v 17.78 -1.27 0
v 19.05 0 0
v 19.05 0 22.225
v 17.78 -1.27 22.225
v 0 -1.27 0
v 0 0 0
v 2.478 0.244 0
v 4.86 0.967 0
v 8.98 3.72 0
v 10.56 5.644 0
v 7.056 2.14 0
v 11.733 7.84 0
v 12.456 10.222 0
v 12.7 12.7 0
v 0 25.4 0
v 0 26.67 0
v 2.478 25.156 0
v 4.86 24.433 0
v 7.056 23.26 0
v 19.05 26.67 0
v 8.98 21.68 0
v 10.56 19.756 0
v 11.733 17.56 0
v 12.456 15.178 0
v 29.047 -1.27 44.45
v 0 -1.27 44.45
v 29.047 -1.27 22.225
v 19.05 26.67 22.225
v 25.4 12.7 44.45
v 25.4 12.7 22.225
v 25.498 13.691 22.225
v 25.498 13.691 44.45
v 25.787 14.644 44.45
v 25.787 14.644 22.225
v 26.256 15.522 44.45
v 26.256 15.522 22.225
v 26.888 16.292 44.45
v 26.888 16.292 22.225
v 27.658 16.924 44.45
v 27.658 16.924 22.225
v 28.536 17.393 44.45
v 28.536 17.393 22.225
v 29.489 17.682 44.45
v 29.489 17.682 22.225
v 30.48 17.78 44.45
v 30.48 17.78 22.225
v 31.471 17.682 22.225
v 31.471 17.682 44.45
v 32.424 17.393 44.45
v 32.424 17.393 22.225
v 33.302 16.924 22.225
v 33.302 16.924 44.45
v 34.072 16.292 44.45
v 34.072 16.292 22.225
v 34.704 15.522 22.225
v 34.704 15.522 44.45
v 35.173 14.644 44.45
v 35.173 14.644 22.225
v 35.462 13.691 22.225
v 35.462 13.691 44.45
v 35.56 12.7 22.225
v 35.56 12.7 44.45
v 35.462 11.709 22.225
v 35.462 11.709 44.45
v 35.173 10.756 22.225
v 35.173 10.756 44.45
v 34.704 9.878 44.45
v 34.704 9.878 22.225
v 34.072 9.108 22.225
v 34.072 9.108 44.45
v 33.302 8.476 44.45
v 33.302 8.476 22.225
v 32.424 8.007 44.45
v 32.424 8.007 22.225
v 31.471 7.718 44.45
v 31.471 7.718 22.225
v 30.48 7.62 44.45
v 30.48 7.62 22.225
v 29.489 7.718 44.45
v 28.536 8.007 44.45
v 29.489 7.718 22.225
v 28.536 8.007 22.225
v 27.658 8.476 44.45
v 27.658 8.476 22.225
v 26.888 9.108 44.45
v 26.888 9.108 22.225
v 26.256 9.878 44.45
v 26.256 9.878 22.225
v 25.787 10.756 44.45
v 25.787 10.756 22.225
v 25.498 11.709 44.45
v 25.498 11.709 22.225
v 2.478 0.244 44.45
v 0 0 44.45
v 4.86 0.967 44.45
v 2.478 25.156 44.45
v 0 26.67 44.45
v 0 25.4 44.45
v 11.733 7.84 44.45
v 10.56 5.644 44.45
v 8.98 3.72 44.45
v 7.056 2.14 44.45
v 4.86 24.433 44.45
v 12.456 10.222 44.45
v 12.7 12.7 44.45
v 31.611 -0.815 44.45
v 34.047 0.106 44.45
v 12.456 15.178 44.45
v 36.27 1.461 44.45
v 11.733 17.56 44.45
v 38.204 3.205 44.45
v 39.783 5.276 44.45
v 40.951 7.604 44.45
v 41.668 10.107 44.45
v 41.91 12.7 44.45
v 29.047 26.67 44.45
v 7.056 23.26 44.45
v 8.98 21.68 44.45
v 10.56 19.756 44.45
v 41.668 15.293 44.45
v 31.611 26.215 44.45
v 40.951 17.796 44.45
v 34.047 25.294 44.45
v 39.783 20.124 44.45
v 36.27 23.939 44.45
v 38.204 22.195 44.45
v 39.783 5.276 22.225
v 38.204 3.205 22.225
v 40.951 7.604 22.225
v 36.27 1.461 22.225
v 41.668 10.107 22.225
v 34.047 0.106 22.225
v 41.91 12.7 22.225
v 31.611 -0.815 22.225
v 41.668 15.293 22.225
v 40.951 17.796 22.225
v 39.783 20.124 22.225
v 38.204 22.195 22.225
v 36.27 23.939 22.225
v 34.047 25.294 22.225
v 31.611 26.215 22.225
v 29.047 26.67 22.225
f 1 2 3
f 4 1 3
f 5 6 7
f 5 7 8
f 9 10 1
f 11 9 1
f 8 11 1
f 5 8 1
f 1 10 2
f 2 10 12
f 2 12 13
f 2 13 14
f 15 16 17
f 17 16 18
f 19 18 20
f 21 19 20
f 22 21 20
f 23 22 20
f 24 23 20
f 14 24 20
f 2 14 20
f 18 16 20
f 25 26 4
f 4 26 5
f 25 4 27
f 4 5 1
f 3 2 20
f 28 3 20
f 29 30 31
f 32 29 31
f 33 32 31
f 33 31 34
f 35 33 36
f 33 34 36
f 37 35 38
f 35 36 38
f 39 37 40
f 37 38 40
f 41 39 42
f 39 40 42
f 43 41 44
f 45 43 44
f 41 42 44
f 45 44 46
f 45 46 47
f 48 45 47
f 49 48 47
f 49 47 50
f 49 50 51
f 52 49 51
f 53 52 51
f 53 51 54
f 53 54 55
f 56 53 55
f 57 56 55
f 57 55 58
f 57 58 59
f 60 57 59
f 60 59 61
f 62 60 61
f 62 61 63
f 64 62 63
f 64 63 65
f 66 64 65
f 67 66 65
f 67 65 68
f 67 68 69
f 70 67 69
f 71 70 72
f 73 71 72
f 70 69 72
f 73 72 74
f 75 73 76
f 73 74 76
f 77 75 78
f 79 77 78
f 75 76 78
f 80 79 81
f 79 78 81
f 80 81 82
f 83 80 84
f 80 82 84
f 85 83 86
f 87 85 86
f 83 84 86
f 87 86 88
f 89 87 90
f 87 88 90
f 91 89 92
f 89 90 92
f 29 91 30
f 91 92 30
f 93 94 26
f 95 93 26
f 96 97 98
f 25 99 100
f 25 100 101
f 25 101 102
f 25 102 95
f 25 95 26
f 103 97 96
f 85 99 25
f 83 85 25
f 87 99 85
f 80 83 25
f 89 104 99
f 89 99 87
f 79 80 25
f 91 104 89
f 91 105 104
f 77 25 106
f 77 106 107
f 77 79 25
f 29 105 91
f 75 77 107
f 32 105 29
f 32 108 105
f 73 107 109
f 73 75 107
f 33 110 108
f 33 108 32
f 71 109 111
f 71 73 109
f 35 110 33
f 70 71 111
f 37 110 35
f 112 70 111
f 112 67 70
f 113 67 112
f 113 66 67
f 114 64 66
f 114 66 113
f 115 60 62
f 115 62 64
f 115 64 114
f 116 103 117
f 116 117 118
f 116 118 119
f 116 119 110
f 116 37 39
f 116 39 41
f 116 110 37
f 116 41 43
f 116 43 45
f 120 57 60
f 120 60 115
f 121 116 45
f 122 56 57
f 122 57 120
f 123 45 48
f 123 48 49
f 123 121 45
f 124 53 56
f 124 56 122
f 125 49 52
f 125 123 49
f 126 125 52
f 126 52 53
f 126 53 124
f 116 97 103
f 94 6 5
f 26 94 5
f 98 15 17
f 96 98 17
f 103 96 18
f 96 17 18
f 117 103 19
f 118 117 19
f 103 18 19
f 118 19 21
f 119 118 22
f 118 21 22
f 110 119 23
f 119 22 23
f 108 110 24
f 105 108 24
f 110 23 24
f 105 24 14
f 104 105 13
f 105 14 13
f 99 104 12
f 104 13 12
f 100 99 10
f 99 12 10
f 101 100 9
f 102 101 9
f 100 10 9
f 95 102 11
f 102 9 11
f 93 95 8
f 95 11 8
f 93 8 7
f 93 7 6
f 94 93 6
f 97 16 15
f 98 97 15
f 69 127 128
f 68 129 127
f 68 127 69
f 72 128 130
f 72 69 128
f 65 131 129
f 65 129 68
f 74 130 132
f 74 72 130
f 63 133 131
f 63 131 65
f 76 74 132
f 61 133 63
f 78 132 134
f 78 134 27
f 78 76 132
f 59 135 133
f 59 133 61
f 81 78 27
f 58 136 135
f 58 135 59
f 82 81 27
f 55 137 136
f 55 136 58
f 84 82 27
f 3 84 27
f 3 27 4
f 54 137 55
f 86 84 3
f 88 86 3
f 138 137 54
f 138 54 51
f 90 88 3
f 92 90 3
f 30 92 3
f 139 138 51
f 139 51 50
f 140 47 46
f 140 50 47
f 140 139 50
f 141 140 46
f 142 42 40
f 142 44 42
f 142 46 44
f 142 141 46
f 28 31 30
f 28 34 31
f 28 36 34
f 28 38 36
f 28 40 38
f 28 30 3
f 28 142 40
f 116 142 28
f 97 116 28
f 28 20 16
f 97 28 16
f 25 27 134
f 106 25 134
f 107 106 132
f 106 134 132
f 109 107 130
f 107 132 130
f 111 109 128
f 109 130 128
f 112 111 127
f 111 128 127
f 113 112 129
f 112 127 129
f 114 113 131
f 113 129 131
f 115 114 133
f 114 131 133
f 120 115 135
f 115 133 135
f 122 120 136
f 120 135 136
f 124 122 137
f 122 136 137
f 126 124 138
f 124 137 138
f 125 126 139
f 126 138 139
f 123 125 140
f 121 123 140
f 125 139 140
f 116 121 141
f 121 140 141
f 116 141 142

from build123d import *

# Parameters (mm, degrees)
BOSS_EXTRUDE1_DEPTH          = 44.45
CUT_EXTRUDE1_DEPTH           = 22.225
F_3_8_0_375_DIAMETER_HOLE1_D = 10.16
CHAMFER1_SIZE                = 1.27


with BuildPart() as part:
    # Sketch1 → Boss-Extrude1 (new body)
    with BuildSketch(Plane.XY):
        with BuildLine():
            Line((0, -1.27), (29.046742048, -1.27))
            ThreePointArc((29.046742048, -1.27), (41.91, 12.7), (29.046742048, 26.67))
            Line((29.046742048, 26.67), (0, 26.67))
            Line((0, 26.67), (0, 25.4))
            ThreePointArc((0, 25.4), (12.7, 12.7), (0, 0))
            Line((0, 0), (0, -1.27))
        make_face()
    extrude(amount=BOSS_EXTRUDE1_DEPTH)

    # Sketch2 → Cut-Extrude1 (cut)
    with BuildSketch(Plane(origin=(0, 0, 0), x_dir=(-1, 0, 0), z_dir=(0, 0, -1))):
        with BuildLine():
            Line((-19.05, -1.27), (-19.05, 26.67))
            Line((-19.05, 26.67), (-29.046742048, 26.67))
            ThreePointArc((-29.046742048, 26.67), (-41.91, 12.7), (-29.046742048, -1.27))
            Line((-29.046742048, -1.27), (-19.05, -1.27))
        make_face()
    extrude(amount=-CUT_EXTRUDE1_DEPTH, mode=Mode.SUBTRACT)

    # 3/8 (0.375) Diameter Hole1 (through all)
    with Locations(Plane.XY.offset(44.45)):
        with Locations((30.48, 12.7)):
            Hole(F_3_8_0_375_DIAMETER_HOLE1_D / 2)

    # Chamfer1
    chamfer1_edges = [part.edges().sort_by_distance(p)[0] for p in [
        (19.05, -1.27, 11.1125),
    ]]
    chamfer(chamfer1_edges, length=CHAMFER1_SIZE)


solid = part.part
